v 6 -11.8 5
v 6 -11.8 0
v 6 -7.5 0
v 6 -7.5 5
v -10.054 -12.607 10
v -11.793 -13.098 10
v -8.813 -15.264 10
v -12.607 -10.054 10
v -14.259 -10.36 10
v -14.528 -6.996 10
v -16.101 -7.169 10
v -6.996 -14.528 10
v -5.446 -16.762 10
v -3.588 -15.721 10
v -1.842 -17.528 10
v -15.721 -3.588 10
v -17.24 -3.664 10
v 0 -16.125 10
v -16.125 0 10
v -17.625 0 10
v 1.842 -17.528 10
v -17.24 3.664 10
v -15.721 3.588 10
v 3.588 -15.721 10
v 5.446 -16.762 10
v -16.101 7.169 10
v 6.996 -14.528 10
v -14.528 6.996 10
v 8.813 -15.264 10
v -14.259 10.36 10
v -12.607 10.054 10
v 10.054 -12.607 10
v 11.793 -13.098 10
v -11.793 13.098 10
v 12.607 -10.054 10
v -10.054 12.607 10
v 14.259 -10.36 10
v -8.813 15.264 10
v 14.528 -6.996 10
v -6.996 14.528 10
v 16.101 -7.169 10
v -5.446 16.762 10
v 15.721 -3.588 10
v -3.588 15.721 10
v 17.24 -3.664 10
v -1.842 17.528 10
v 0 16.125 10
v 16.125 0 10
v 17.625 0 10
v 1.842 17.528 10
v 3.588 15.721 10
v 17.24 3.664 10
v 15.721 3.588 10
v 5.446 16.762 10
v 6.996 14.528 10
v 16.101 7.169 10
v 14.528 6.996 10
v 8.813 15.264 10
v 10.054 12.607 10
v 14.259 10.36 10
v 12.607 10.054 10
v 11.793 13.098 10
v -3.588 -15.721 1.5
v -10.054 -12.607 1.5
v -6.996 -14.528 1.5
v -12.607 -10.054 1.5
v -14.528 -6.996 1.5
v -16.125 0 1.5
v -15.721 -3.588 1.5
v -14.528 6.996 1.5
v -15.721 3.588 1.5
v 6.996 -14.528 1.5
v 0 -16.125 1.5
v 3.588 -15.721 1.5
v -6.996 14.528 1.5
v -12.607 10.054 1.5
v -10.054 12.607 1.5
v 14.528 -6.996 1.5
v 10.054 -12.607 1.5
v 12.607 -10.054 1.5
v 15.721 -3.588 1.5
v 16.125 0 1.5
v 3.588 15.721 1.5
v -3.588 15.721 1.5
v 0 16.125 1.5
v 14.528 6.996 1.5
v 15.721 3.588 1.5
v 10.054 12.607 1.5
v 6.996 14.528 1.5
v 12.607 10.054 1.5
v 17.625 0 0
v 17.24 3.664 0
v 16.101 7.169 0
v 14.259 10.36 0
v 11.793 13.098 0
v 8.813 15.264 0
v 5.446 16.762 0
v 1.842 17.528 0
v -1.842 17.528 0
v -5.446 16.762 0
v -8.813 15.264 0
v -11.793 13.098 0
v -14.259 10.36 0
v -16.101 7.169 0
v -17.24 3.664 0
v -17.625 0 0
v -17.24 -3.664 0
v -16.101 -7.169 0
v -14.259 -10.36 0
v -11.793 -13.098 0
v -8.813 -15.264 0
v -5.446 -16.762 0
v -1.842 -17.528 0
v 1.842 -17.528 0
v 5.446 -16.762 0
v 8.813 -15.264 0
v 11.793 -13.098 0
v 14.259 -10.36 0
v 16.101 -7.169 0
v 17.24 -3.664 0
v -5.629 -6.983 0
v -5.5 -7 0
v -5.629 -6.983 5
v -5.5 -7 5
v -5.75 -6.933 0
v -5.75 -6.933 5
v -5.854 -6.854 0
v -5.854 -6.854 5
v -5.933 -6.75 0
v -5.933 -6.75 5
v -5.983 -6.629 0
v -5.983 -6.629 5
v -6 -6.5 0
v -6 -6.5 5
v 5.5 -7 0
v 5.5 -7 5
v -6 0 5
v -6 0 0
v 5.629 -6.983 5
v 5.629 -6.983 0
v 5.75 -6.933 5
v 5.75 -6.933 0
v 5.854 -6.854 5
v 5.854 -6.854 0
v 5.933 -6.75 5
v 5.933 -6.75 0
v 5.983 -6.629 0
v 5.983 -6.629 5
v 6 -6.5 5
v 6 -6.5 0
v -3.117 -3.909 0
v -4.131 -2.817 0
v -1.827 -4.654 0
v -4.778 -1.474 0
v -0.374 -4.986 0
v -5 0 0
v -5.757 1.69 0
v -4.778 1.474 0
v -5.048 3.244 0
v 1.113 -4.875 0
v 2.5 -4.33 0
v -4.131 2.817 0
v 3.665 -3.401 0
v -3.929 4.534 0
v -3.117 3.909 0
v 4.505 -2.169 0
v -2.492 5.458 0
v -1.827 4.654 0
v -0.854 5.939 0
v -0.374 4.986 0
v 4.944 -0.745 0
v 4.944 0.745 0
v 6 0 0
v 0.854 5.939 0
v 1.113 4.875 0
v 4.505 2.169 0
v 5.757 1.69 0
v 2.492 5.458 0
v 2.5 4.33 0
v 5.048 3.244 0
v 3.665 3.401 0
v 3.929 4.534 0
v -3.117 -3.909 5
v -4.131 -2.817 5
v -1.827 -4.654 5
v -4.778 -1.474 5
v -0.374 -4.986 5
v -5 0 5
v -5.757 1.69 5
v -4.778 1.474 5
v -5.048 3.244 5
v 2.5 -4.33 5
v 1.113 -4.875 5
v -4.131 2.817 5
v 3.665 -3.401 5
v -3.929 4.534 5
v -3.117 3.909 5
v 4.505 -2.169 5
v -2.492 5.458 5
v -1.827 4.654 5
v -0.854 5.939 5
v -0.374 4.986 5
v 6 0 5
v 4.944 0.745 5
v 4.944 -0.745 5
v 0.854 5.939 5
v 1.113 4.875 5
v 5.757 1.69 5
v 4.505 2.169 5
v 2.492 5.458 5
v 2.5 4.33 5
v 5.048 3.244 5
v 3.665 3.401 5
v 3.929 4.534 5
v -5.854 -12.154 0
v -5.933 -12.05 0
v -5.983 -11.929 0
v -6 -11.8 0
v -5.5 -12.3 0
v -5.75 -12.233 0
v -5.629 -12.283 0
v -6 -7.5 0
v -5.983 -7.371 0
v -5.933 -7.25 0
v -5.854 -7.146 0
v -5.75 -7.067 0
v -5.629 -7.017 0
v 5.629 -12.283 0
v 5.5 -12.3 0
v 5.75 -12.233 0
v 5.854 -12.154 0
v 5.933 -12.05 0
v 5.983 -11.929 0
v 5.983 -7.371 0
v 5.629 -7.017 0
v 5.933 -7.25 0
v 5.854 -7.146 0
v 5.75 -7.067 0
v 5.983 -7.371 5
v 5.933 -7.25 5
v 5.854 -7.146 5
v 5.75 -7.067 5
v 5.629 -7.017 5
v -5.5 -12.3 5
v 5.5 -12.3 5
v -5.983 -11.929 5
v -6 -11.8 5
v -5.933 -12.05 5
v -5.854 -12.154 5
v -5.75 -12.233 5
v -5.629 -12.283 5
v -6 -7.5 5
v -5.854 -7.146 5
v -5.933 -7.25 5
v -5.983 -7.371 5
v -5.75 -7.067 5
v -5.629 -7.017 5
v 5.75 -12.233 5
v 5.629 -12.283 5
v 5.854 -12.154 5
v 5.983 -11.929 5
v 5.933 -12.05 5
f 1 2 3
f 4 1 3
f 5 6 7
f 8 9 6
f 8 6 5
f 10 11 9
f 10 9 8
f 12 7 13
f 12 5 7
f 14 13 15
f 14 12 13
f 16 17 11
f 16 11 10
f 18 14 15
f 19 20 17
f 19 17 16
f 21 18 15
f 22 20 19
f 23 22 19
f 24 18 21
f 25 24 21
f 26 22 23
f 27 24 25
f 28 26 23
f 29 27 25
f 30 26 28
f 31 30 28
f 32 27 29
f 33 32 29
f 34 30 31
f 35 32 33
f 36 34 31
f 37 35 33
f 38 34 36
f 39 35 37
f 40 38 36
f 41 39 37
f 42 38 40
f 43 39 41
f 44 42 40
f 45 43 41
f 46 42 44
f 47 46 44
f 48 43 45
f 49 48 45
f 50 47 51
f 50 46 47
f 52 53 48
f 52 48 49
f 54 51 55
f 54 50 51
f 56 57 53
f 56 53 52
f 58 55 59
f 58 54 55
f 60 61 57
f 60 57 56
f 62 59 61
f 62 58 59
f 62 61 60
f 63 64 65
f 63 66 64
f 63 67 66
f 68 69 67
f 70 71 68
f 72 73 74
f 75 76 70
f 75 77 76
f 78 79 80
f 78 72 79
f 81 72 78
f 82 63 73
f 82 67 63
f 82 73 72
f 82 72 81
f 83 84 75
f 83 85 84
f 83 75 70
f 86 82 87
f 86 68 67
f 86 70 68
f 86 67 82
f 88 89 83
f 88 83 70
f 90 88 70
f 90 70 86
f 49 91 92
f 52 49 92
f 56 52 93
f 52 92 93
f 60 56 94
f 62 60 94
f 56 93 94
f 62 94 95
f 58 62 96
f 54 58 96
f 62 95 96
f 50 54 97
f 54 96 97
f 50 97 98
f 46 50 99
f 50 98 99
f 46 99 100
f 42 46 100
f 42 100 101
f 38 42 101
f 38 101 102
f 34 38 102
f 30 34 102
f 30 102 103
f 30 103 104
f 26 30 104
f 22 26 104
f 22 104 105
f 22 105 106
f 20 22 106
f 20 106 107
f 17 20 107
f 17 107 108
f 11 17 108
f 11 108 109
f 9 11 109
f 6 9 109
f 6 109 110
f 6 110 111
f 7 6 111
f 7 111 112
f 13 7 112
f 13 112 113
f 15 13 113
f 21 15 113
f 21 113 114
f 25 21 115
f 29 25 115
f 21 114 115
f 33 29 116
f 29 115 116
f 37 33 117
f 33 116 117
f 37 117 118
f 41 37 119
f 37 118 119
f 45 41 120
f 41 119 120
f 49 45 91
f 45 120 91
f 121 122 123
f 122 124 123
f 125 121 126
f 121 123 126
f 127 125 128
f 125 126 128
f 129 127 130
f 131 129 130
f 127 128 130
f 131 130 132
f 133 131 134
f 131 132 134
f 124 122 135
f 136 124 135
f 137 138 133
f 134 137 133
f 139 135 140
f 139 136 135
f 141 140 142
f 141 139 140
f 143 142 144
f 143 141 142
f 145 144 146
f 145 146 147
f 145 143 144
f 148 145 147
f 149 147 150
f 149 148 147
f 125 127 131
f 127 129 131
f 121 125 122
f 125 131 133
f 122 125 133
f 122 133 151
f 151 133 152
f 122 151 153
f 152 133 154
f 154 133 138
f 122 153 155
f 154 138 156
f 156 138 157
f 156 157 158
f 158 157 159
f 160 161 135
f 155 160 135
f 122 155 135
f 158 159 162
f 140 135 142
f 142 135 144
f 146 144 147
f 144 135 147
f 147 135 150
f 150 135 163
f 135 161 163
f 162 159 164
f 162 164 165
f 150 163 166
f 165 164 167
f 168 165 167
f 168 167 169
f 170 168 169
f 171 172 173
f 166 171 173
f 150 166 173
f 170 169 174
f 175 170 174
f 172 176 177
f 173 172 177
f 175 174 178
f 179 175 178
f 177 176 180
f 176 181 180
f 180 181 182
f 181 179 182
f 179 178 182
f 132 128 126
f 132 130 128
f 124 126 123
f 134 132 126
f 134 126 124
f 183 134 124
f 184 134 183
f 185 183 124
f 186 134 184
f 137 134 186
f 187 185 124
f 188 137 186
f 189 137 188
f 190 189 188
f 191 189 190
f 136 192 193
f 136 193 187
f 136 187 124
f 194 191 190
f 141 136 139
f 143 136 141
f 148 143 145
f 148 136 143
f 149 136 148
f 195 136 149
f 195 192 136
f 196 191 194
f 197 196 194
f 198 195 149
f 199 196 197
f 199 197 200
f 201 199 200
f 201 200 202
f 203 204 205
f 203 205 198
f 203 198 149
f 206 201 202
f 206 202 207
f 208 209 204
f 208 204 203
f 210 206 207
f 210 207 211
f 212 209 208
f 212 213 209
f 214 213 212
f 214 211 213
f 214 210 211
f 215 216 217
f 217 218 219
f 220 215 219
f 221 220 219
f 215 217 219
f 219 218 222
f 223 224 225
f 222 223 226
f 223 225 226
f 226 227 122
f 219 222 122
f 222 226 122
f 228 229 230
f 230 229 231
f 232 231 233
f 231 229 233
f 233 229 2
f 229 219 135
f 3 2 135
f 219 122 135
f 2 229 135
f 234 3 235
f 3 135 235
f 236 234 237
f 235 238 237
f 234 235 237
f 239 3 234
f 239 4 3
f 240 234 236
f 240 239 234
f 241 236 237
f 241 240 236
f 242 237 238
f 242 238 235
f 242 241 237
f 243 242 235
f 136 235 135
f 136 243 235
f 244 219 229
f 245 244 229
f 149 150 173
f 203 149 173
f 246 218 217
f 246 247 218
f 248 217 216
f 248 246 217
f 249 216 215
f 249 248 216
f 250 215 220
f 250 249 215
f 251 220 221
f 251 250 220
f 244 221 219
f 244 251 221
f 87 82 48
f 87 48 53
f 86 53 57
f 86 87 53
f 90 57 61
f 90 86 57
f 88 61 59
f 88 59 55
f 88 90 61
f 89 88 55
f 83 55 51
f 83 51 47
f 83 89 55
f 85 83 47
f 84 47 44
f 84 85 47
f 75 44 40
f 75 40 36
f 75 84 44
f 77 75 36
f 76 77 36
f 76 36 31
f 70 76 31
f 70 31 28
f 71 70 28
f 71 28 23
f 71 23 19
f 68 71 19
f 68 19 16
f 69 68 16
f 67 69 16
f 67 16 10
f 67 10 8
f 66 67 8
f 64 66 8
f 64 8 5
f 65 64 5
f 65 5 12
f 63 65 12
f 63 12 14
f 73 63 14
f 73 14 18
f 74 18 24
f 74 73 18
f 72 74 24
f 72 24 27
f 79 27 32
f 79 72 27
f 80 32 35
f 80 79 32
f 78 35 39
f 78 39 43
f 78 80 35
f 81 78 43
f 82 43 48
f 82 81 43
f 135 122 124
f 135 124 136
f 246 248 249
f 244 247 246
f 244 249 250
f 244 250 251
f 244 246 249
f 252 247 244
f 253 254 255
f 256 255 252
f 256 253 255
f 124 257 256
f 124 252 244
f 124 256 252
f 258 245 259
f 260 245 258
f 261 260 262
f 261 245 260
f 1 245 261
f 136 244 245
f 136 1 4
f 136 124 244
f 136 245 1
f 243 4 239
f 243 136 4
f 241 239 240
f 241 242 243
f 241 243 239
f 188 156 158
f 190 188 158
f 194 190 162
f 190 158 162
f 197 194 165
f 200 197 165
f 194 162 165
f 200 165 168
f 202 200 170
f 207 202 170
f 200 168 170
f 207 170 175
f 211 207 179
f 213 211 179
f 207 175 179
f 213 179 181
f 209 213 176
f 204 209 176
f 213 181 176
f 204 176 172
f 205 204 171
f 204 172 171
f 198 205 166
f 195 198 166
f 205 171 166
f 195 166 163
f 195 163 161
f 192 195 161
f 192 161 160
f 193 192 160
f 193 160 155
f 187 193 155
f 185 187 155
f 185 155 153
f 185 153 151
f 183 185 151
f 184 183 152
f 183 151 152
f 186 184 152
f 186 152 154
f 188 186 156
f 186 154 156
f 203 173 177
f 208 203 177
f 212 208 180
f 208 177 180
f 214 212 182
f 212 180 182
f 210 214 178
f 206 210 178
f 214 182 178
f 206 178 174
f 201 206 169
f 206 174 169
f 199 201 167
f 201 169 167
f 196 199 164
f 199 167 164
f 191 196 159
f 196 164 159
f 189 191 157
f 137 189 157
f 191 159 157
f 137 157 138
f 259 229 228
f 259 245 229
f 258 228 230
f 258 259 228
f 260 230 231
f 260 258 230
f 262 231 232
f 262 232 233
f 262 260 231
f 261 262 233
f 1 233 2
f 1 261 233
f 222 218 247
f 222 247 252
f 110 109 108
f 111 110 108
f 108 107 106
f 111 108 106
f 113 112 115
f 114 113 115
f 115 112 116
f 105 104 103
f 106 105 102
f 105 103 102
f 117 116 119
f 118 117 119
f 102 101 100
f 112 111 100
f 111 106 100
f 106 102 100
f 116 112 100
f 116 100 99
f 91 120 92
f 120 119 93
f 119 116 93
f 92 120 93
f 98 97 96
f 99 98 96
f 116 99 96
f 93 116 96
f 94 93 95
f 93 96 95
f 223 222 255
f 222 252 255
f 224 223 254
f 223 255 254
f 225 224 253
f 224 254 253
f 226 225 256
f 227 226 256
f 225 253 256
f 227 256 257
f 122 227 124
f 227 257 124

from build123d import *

# Parameters (mm, degrees)
F0_R     = 17.625
F0_R_2   = 16.125
F1_DEPTH = 1.5
F2_DEPTH = 10
F4_DEPTH = 5
F3_W     = 12
F3_H     = 5.3
F5_DEPTH = 5
F6_R     = 0.5
F6_2_R   = 0.5


with BuildPart() as f1:
    # F0 (on Top) → F1 (new body)
    with BuildSketch(Plane.XY):
        Circle(F0_R)
        Circle(F0_R_2, mode=Mode.SUBTRACT)
        Circle(F0_R_2)
    extrude(amount=F1_DEPTH)

    # F0 (on Top) → F2 (join)
    with BuildSketch(Plane.XY):
        Circle(F0_R)
        Circle(F0_R_2, mode=Mode.SUBTRACT)
    extrude(amount=F2_DEPTH)


with BuildPart() as f4:
    # F3 (on Top) → F4 (new body)
    with BuildSketch(Plane.XY):
        with BuildLine():
            Line((6, -7), (6, 0))
            ThreePointArc((6, 0), (0, -6), (-6, 0))
            Line((-6, 0), (-6, -7))
            Line((-6, -7), (6, -7))
        make_face()
        with BuildLine():
            ThreePointArc((-6, 0), (0, -6), (6, 0))
            Line((6, 0), (5, 0))
            ThreePointArc((5, 0), (0, -5), (-5, 0))
            Line((-5, 0), (-6, 0))
        make_face()
        with BuildLine():
            Line((5, 0), (6, 0))
            ThreePointArc((6, 0), (0, 6), (-6, 0))
            Line((-6, 0), (-5, 0))
            ThreePointArc((-5, 0), (0, 5), (5, 0))
        make_face()
    extrude(amount=F4_DEPTH)

    # F6
    f6_edges = [f4.edges().sort_by_distance(p)[0] for p in [
        (-6, -7, 2.5),
        (6, -7, 2.5),
    ]]
    fillet(f6_edges, radius=F6_R)


with BuildPart() as f5:
    # F3 (on Top) → F5 (new body)
    with BuildSketch(Plane.XY):
        with Locations((0, -9.65)):
            Rectangle(F3_W, F3_H)
    extrude(amount=F5_DEPTH)

    # F6#2
    f6_2_edges = [f5.edges().sort_by_distance(p)[0] for p in [
        (-6, -7, 2.5),
        (6, -7, 2.5),
        (6, -12.3, 2.5),
        (-6, -12.3, 2.5),
    ]]
    fillet(f6_2_edges, radius=F6_2_R)


solid = Compound([f1.part, f4.part, f5.part])
